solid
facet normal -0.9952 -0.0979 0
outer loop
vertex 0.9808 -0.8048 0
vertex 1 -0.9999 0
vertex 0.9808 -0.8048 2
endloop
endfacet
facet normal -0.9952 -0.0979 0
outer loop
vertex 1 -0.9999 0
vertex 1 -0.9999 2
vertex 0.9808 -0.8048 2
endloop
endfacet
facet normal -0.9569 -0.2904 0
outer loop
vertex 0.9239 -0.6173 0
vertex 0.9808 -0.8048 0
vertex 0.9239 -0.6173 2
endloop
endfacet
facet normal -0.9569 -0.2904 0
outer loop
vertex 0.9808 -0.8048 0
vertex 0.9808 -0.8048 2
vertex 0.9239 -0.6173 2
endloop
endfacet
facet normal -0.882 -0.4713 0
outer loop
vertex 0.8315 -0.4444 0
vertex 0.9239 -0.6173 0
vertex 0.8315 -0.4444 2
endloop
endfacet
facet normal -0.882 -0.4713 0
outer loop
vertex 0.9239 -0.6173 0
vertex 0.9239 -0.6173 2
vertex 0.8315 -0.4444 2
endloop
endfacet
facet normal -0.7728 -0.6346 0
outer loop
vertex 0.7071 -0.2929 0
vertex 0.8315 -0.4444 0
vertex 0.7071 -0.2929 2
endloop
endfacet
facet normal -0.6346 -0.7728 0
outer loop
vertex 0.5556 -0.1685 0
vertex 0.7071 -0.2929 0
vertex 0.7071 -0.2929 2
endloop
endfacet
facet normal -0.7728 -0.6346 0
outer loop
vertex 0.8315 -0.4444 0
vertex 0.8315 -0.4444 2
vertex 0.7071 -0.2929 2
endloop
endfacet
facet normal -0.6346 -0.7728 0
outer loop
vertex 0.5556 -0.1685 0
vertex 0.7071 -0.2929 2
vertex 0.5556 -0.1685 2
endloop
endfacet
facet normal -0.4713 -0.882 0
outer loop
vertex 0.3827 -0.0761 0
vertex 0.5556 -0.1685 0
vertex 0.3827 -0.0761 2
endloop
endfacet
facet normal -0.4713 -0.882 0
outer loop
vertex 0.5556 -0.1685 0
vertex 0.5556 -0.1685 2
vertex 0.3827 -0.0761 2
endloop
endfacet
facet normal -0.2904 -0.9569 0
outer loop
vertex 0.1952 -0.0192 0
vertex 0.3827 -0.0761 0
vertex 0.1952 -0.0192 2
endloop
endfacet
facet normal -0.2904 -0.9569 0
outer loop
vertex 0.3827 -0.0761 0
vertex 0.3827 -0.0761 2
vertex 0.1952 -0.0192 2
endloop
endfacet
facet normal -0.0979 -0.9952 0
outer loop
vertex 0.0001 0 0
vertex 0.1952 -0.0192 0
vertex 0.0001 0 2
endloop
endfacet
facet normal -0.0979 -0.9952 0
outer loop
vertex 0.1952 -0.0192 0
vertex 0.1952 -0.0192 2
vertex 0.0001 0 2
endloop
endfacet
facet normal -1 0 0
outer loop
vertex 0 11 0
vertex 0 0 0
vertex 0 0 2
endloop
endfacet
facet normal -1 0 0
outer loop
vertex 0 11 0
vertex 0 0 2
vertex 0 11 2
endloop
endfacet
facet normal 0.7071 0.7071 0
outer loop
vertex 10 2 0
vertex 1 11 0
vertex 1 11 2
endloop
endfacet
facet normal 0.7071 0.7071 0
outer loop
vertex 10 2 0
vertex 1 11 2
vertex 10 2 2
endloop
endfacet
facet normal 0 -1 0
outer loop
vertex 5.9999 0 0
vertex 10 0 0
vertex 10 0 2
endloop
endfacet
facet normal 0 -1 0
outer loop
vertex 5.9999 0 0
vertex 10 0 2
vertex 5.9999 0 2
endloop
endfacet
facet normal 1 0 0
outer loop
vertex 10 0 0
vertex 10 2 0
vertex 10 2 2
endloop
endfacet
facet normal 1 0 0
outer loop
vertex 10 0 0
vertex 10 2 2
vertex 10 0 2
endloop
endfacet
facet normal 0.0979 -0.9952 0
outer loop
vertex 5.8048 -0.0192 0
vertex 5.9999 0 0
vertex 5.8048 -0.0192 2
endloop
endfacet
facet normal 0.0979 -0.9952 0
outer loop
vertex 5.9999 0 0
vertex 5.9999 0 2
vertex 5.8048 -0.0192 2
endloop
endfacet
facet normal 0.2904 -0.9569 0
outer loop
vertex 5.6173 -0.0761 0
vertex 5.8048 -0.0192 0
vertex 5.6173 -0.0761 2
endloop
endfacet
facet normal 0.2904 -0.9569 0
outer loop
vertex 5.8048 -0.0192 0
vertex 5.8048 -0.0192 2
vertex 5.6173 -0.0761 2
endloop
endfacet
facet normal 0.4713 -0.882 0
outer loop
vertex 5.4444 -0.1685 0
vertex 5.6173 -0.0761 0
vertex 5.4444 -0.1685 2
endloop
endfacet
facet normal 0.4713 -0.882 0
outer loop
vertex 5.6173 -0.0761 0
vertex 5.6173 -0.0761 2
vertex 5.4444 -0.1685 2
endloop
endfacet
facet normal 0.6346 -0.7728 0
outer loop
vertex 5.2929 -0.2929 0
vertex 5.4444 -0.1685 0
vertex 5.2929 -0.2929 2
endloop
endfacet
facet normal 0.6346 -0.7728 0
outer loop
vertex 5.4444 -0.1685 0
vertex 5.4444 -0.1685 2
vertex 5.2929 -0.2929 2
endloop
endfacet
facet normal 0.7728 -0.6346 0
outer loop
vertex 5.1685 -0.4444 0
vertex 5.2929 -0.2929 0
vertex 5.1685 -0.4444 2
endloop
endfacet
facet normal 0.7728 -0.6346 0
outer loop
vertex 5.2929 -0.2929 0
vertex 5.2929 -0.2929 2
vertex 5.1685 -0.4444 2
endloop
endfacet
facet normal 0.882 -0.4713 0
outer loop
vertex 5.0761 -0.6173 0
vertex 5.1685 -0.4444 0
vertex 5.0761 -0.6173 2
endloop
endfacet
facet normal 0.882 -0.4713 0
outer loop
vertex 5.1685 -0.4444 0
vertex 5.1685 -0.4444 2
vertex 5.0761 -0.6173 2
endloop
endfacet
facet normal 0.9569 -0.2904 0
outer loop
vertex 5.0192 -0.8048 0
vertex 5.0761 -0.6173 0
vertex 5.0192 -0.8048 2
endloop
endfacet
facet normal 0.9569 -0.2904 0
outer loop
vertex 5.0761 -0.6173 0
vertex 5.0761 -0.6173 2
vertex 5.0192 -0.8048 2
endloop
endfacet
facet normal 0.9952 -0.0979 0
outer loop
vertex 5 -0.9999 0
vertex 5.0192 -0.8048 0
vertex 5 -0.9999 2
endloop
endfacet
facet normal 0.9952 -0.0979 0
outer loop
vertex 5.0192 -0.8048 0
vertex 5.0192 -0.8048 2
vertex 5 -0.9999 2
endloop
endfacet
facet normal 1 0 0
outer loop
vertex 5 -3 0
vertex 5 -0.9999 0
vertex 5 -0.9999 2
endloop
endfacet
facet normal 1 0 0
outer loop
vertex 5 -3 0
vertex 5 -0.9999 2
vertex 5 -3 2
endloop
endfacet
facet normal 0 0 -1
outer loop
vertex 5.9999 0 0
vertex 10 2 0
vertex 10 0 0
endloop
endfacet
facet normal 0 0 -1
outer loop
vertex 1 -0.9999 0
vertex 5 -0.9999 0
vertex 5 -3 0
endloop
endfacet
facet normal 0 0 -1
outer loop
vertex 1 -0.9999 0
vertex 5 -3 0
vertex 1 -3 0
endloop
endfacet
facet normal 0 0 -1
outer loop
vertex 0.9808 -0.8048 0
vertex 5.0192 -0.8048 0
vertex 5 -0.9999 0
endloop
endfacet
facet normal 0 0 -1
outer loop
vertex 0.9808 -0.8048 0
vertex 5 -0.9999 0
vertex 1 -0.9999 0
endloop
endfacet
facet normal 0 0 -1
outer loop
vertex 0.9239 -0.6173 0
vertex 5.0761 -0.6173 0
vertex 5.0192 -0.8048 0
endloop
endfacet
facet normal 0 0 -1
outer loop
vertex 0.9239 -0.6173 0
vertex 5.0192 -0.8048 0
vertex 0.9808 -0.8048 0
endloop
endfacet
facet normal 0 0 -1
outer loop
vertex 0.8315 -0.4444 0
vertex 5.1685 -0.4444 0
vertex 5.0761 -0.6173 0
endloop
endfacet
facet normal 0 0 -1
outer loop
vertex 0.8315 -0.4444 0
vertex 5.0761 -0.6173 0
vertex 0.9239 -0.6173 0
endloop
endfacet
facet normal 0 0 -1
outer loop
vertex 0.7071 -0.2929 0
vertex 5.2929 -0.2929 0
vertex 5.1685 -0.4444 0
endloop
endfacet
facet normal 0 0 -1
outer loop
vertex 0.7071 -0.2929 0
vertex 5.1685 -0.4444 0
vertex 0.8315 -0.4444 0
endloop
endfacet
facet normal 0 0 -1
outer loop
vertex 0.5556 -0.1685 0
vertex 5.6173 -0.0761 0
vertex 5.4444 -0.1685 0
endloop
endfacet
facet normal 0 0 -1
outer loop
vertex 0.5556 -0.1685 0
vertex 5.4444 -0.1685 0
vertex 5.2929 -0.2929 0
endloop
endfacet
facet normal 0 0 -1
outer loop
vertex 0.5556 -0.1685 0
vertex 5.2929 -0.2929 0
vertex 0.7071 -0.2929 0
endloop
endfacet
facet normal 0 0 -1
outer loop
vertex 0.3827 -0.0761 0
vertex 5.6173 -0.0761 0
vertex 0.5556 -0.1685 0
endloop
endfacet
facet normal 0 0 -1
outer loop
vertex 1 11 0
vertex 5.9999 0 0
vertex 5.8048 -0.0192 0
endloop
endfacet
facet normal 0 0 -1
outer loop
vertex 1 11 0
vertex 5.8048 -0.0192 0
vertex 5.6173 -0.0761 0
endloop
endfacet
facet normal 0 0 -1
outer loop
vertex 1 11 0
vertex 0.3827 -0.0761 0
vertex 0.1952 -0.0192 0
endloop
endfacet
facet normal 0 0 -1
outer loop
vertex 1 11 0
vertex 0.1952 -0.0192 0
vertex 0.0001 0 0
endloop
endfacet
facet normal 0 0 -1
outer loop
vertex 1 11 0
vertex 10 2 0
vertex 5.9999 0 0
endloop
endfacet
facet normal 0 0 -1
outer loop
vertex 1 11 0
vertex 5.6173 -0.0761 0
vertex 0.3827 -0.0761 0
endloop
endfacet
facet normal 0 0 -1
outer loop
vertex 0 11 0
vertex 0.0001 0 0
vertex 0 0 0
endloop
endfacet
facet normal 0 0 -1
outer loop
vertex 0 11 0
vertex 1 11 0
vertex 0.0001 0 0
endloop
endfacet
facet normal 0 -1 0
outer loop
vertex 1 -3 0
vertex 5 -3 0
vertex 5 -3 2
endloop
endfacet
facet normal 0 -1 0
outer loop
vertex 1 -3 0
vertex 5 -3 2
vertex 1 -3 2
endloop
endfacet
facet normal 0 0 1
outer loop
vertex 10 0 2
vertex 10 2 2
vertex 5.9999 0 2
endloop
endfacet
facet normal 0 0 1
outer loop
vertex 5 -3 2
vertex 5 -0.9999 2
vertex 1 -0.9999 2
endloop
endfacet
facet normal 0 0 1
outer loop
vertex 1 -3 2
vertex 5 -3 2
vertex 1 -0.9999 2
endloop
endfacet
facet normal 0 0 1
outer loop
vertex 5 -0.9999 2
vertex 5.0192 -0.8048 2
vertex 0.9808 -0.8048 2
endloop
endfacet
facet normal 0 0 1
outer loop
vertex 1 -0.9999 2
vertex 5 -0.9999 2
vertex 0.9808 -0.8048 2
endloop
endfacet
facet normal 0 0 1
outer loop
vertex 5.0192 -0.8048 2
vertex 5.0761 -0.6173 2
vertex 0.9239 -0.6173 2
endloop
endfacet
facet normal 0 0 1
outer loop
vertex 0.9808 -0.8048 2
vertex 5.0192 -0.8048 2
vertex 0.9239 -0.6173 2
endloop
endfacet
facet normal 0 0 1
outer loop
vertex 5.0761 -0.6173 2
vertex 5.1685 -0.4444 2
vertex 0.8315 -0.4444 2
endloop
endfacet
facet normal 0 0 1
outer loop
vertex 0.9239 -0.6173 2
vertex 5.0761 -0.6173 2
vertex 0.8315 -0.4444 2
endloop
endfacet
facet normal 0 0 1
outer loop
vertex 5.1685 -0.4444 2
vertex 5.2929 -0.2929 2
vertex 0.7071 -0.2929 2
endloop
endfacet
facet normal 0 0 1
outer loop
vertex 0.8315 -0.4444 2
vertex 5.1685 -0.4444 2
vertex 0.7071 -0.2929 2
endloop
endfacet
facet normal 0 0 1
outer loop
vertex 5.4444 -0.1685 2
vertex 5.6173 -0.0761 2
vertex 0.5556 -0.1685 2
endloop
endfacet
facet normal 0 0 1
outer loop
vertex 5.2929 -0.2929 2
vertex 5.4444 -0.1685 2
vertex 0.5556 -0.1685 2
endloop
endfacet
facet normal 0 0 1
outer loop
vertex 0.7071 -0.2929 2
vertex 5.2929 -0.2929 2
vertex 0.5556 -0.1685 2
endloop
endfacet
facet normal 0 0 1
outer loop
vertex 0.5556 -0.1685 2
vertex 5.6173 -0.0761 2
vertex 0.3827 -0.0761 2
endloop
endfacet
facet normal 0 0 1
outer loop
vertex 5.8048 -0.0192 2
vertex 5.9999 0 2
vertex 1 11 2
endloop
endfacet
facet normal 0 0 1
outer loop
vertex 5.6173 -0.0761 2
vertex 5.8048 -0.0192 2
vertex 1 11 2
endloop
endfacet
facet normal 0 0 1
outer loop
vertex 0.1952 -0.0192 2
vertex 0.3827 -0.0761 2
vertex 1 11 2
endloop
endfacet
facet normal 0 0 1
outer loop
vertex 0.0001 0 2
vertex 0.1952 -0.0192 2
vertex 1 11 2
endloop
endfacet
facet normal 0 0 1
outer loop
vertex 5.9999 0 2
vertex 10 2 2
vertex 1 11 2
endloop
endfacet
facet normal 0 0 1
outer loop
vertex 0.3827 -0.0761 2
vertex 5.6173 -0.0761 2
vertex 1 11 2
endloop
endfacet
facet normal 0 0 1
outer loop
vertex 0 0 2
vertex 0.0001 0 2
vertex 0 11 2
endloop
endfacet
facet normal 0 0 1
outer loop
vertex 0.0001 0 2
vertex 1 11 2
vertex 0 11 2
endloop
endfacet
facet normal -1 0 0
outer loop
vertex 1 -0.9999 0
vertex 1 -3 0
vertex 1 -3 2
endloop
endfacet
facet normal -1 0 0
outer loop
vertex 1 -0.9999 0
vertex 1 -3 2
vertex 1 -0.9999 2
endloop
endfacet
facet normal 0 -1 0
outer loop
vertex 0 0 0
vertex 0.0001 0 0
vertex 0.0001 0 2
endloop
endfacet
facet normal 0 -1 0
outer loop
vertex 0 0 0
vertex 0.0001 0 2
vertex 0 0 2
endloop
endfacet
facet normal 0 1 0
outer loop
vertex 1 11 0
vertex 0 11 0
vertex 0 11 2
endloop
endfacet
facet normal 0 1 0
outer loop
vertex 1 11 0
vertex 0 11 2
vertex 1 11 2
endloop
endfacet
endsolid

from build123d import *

# Parameters (mm, degrees)
BOSS_EXTRU_1_DEPTH = 2
CONG_1_R           = 1


with BuildPart() as part:
    # Esquisse1 → Boss.-Extru.1 (new body)
    with BuildSketch(Plane.XY):
        Polygon((0, 0), (0, 11), (1, 11), (10, 2), (10, 0), (5, 0), (5, -3), (1, -3), (1, 0), align=None)
    extrude(amount=BOSS_EXTRU_1_DEPTH)

    # Congé1
    cong_1_edges = [part.edges().sort_by_distance(p)[0] for p in [
        (5, 0, 1),
        (1, 0, 1),
    ]]
    fillet(cong_1_edges, radius=CONG_1_R - 0.0001)  # a hair under: the kernel refuses the full size


solid = part.part
